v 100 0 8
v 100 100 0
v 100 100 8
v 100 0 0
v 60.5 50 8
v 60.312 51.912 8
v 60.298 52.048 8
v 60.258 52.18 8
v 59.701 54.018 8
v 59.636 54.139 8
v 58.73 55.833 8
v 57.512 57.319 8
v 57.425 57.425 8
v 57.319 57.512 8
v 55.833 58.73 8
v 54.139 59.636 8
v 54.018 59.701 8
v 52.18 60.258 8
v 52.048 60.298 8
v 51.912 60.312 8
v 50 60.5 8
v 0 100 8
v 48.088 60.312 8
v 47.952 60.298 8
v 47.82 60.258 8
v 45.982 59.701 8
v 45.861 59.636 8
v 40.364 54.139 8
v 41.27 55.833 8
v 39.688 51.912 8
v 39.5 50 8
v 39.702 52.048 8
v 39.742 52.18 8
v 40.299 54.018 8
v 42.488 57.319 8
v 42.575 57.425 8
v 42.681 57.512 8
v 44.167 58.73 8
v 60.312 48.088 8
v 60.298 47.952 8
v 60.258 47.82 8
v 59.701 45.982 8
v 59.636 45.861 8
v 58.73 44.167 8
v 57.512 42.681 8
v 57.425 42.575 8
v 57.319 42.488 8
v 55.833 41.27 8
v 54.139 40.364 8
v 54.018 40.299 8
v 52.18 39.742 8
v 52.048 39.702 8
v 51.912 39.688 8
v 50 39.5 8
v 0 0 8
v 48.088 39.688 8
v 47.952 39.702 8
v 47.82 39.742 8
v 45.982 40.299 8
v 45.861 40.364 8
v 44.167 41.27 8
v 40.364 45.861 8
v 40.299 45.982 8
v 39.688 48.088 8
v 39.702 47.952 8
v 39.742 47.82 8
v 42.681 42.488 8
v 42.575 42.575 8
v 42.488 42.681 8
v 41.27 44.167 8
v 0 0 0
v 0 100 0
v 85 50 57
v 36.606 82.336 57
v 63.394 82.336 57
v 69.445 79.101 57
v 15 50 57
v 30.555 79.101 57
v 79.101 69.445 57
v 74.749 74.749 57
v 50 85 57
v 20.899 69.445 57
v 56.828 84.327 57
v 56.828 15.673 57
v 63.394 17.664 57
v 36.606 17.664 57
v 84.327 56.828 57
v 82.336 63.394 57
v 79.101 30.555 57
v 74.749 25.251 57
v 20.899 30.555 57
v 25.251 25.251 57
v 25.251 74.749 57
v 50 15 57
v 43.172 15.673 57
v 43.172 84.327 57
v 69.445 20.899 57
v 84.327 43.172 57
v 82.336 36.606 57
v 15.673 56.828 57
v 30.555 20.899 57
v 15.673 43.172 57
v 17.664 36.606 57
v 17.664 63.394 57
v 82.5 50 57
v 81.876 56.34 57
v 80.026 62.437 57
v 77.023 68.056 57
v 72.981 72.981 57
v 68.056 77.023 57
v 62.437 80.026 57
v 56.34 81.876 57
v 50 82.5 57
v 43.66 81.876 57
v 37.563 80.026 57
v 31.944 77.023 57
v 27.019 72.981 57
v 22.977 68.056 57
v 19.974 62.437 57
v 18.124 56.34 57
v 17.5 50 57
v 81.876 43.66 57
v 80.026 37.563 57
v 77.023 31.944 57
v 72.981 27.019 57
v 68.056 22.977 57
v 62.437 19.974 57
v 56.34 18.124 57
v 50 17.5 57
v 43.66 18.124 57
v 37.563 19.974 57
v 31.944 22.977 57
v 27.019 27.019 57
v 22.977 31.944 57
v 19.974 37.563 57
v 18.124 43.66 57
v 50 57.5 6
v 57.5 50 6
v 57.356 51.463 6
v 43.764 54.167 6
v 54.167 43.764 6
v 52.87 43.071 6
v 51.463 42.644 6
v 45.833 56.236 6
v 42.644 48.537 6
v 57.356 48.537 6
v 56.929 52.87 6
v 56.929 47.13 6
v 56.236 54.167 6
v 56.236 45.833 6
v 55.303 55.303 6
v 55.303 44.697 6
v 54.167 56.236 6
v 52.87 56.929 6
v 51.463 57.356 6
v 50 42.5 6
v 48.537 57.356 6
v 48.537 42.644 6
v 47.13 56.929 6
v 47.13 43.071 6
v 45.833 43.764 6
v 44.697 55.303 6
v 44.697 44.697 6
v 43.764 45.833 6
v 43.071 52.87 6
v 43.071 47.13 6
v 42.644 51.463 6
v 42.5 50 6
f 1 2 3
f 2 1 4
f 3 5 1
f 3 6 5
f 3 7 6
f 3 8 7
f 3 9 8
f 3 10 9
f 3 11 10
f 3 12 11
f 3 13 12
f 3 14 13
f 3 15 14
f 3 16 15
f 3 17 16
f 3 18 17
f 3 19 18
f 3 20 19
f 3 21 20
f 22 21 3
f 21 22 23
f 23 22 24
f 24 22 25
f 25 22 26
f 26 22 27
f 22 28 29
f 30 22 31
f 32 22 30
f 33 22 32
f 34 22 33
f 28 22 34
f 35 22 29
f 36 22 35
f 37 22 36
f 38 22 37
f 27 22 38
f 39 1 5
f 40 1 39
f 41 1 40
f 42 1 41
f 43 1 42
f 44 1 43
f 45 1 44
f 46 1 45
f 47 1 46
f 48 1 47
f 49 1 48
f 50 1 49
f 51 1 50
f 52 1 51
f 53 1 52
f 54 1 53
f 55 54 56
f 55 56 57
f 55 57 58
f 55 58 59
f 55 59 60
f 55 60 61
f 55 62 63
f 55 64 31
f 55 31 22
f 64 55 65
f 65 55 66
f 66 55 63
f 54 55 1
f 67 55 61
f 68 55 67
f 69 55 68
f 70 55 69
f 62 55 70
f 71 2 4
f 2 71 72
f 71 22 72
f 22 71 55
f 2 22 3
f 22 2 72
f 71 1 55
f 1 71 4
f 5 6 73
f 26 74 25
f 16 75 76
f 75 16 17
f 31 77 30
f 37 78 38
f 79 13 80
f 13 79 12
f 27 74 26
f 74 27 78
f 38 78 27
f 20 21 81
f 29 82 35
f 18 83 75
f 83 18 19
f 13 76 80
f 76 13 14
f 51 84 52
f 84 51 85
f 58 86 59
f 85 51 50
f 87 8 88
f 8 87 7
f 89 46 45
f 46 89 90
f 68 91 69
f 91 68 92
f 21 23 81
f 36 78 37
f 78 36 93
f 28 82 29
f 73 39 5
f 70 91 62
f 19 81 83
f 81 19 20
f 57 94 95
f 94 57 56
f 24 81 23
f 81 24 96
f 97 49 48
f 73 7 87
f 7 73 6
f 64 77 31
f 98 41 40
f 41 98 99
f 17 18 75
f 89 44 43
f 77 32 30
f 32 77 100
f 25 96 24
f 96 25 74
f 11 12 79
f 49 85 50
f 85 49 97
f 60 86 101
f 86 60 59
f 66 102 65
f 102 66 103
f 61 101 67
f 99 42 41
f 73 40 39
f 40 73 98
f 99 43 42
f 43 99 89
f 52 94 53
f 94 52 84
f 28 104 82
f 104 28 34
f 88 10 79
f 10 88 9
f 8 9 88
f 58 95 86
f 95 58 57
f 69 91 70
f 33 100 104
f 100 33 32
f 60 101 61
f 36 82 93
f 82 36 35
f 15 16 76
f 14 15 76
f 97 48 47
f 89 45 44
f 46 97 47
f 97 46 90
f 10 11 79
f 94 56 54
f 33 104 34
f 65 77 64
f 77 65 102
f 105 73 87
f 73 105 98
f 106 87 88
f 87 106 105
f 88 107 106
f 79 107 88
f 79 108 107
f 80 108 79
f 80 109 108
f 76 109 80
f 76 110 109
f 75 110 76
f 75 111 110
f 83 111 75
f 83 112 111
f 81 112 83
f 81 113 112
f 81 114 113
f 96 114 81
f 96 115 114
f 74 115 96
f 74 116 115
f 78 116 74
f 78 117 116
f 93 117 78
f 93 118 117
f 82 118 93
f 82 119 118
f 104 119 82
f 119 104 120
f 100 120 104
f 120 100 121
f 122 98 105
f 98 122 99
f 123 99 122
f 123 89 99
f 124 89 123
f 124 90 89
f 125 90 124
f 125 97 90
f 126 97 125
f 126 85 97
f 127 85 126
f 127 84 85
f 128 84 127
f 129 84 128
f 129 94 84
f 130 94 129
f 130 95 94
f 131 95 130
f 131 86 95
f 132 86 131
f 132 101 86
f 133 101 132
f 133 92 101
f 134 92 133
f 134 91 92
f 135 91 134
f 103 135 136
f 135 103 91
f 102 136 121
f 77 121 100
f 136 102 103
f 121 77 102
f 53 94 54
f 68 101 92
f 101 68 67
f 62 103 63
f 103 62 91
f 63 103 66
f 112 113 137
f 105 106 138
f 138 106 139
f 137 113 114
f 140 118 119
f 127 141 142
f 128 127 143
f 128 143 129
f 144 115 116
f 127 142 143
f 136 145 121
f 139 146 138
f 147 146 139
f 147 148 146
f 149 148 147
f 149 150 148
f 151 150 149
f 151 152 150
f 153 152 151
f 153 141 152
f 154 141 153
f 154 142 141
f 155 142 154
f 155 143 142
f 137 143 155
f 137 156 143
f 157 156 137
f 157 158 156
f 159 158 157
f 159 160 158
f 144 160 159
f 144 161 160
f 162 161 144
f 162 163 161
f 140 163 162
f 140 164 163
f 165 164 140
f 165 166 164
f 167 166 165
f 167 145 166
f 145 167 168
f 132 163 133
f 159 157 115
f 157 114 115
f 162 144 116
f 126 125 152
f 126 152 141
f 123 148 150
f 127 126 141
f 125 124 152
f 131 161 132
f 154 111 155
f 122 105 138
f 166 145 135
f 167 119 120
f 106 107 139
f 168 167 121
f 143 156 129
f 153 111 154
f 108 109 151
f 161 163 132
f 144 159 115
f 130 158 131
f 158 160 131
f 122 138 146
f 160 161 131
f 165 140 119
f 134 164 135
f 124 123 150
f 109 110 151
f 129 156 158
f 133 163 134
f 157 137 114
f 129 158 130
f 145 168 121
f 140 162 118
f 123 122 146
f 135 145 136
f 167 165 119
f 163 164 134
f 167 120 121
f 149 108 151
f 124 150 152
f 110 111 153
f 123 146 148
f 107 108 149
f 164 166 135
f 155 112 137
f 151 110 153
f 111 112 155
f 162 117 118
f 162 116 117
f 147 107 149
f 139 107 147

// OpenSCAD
$fn = 32;

// ----------------------------------------------------------------------
// Hopper: funnel with square flange
// ----------------------------------------------------------------------

// --- parameters (mm) ---
fl = 100;                 // flange side, X and Y
fl_t = 8;                 // flange thickness
cone_h = 50;              // cone height above the flange
top_d = 70;               // cone mouth diameter
bot_d = 20;               // cone spout diameter
wall = 2.5;               // cone wall thickness
fit_tol = 0.05;           // tolerance for press fits, mm
free_tol = 0.3;           // tolerance for clearance fits, mm

bore_d = bot_d - 2 * wall;  // spout bore diameter
total_h = fl_t + cone_h - 1;  // overall height

difference() {
  union() {
    cube([fl, fl, fl_t]);
    translate([fl / 2, fl / 2, fl_t - 1])
      cylinder(h = cone_h, d1 = bot_d, d2 = top_d);
  }
  translate([fl / 2, fl / 2, fl_t - 2])
    cylinder(h = cone_h + 1, d1 = bore_d, d2 = top_d - 2 * wall);
}
